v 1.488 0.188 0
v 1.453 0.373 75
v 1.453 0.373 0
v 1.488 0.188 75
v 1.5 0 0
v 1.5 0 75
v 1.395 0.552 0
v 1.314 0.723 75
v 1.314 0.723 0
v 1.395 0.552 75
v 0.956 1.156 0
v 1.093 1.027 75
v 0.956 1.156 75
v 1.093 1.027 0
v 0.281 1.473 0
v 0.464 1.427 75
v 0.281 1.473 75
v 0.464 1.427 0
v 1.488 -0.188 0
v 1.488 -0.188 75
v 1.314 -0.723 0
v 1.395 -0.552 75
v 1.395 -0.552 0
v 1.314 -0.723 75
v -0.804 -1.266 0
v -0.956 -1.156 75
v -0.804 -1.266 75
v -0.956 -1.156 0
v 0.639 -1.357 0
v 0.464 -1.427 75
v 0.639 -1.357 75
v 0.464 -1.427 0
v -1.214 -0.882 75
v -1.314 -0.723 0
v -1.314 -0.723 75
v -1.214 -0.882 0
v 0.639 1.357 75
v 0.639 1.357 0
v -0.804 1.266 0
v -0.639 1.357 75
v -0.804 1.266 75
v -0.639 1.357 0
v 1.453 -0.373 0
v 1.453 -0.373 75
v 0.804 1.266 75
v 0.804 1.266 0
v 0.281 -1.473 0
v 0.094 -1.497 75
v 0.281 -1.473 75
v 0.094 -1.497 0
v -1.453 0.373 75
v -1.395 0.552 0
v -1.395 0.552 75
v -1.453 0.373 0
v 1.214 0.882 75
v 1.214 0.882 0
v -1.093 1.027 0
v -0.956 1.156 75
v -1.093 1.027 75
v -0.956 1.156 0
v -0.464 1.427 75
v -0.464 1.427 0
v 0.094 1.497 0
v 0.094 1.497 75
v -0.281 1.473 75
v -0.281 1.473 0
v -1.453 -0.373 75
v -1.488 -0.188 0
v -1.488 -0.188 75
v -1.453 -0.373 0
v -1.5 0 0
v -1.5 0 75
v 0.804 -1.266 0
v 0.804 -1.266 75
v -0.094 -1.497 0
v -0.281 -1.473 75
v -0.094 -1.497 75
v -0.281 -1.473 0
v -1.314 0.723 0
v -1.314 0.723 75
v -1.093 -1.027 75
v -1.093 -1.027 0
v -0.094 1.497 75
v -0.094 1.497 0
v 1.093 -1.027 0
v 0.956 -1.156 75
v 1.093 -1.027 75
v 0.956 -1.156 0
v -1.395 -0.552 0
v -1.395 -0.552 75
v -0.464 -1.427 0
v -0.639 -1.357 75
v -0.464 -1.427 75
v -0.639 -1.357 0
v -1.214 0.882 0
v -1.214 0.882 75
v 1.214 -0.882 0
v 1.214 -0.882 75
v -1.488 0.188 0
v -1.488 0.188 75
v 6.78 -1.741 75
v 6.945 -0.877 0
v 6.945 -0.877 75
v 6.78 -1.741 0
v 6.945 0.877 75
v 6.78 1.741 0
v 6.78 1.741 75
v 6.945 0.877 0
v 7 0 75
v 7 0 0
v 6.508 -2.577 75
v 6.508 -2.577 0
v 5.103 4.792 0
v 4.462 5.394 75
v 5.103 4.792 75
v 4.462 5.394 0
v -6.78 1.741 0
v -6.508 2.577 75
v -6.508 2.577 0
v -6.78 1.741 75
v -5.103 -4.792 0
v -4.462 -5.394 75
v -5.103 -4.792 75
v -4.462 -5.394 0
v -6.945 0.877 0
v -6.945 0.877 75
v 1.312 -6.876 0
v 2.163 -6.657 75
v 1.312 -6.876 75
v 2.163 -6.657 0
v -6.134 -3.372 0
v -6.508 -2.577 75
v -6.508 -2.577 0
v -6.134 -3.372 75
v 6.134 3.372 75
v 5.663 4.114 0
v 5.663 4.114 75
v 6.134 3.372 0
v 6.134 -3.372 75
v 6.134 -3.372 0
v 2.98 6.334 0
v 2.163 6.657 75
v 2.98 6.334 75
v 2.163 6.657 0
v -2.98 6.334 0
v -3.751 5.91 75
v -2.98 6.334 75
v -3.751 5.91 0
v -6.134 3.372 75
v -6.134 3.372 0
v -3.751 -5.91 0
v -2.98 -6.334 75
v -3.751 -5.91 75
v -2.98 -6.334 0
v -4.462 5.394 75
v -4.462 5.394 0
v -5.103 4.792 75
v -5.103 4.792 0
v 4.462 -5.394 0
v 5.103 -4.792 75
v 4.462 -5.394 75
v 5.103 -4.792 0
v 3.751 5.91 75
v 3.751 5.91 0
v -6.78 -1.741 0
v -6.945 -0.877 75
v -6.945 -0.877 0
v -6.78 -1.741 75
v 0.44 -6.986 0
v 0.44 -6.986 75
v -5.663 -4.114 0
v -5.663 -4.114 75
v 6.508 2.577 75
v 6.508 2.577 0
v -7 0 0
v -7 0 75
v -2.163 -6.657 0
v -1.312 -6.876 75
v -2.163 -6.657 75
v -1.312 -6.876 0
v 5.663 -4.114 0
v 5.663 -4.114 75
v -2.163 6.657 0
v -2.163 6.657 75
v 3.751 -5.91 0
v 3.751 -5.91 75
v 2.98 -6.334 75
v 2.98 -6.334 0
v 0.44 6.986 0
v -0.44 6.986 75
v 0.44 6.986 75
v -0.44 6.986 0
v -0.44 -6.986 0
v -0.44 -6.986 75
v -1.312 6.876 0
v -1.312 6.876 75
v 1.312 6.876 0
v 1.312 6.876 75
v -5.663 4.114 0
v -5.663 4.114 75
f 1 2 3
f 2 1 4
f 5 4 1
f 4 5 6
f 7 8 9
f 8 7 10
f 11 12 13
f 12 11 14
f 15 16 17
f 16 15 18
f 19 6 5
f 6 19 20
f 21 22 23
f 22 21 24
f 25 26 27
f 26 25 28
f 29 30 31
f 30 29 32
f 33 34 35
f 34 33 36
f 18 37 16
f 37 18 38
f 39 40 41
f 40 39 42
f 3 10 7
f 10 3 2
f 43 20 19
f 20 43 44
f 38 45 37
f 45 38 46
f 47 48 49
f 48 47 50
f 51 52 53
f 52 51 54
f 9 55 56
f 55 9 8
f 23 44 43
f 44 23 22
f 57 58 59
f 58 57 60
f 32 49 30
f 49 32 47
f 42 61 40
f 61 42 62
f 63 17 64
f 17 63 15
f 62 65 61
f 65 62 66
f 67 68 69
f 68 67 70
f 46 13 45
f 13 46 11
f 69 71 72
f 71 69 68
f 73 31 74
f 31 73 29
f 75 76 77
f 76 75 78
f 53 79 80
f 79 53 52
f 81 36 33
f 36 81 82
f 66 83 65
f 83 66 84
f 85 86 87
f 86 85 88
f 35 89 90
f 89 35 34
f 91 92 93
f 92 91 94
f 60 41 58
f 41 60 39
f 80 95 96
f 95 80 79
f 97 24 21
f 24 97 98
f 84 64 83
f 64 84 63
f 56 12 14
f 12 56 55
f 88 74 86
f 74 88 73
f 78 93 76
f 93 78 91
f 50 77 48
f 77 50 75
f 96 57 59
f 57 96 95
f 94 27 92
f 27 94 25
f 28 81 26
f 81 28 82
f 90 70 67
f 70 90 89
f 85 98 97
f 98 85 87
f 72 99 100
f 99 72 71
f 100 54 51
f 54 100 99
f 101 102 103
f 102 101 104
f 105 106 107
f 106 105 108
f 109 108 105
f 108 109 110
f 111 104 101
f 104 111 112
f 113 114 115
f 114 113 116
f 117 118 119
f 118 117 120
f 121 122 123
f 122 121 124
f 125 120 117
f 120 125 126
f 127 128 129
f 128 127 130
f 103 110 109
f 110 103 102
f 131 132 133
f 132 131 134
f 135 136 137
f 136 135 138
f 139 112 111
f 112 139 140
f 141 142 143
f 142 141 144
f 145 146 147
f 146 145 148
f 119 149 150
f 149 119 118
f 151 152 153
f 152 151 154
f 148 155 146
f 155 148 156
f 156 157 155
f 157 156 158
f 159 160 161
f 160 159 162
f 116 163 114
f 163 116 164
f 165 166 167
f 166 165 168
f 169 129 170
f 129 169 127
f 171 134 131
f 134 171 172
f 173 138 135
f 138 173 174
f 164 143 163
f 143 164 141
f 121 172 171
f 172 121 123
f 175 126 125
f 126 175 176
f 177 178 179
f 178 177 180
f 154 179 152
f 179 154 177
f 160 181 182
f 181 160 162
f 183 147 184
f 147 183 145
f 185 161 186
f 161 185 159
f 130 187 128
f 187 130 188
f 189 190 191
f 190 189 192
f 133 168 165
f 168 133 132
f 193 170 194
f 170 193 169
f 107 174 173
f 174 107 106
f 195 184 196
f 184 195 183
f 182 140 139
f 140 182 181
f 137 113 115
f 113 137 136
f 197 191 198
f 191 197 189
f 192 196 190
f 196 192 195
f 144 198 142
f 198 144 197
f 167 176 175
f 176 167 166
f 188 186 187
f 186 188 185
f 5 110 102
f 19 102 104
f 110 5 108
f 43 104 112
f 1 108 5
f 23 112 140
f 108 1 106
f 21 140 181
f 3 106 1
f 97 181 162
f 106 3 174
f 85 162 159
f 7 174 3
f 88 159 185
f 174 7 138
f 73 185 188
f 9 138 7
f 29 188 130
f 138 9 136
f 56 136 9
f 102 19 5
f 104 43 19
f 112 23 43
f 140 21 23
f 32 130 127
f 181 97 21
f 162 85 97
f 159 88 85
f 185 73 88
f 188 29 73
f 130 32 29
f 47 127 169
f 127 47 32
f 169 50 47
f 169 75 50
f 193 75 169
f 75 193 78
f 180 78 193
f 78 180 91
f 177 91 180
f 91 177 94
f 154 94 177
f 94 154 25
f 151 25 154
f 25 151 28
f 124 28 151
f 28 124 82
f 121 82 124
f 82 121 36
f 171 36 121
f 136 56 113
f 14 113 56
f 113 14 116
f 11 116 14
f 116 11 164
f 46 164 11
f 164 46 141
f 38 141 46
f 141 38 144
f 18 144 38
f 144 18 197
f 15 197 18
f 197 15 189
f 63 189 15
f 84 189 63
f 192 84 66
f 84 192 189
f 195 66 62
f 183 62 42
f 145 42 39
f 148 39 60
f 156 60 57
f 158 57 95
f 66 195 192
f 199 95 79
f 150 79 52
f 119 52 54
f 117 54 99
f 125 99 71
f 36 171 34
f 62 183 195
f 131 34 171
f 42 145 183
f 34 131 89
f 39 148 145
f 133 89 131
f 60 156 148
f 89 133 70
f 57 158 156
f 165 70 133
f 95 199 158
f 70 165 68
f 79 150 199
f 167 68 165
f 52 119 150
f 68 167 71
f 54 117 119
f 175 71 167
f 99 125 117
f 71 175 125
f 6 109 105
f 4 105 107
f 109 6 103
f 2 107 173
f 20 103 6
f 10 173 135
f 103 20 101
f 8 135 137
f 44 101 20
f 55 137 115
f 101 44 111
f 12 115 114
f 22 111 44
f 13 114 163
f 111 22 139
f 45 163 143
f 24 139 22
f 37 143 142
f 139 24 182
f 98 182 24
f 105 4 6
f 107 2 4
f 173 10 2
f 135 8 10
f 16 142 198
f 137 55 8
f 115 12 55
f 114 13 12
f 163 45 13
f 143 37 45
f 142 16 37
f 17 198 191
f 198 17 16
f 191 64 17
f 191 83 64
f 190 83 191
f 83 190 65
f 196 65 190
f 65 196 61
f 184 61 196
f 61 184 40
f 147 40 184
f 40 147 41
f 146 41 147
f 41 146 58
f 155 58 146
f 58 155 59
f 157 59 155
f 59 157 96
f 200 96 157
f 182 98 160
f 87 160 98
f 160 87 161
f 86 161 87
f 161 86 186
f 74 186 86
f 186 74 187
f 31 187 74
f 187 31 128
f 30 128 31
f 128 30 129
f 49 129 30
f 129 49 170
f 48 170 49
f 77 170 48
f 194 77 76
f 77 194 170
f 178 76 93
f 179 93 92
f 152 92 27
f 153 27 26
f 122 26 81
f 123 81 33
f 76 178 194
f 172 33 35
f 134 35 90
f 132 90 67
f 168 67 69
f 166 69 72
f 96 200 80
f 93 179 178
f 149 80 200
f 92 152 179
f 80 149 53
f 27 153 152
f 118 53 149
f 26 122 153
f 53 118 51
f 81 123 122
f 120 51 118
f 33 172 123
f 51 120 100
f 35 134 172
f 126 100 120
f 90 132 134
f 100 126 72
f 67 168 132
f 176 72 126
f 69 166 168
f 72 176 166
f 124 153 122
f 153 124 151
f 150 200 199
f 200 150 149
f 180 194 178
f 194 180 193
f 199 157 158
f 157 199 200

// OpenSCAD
$fn = 50;


difference() {
	union() {
		cylinder(h = 75, r = 7.0000000000);
	}
	union() {
		translate(v = [0, 0, -100]) {
			cylinder(h = 200, r = 1.5000000000);
		}
		translate(v = [0, 0, -100]) {
			cylinder(h = 200, r = 1.5000000000);
		}
	}
}
